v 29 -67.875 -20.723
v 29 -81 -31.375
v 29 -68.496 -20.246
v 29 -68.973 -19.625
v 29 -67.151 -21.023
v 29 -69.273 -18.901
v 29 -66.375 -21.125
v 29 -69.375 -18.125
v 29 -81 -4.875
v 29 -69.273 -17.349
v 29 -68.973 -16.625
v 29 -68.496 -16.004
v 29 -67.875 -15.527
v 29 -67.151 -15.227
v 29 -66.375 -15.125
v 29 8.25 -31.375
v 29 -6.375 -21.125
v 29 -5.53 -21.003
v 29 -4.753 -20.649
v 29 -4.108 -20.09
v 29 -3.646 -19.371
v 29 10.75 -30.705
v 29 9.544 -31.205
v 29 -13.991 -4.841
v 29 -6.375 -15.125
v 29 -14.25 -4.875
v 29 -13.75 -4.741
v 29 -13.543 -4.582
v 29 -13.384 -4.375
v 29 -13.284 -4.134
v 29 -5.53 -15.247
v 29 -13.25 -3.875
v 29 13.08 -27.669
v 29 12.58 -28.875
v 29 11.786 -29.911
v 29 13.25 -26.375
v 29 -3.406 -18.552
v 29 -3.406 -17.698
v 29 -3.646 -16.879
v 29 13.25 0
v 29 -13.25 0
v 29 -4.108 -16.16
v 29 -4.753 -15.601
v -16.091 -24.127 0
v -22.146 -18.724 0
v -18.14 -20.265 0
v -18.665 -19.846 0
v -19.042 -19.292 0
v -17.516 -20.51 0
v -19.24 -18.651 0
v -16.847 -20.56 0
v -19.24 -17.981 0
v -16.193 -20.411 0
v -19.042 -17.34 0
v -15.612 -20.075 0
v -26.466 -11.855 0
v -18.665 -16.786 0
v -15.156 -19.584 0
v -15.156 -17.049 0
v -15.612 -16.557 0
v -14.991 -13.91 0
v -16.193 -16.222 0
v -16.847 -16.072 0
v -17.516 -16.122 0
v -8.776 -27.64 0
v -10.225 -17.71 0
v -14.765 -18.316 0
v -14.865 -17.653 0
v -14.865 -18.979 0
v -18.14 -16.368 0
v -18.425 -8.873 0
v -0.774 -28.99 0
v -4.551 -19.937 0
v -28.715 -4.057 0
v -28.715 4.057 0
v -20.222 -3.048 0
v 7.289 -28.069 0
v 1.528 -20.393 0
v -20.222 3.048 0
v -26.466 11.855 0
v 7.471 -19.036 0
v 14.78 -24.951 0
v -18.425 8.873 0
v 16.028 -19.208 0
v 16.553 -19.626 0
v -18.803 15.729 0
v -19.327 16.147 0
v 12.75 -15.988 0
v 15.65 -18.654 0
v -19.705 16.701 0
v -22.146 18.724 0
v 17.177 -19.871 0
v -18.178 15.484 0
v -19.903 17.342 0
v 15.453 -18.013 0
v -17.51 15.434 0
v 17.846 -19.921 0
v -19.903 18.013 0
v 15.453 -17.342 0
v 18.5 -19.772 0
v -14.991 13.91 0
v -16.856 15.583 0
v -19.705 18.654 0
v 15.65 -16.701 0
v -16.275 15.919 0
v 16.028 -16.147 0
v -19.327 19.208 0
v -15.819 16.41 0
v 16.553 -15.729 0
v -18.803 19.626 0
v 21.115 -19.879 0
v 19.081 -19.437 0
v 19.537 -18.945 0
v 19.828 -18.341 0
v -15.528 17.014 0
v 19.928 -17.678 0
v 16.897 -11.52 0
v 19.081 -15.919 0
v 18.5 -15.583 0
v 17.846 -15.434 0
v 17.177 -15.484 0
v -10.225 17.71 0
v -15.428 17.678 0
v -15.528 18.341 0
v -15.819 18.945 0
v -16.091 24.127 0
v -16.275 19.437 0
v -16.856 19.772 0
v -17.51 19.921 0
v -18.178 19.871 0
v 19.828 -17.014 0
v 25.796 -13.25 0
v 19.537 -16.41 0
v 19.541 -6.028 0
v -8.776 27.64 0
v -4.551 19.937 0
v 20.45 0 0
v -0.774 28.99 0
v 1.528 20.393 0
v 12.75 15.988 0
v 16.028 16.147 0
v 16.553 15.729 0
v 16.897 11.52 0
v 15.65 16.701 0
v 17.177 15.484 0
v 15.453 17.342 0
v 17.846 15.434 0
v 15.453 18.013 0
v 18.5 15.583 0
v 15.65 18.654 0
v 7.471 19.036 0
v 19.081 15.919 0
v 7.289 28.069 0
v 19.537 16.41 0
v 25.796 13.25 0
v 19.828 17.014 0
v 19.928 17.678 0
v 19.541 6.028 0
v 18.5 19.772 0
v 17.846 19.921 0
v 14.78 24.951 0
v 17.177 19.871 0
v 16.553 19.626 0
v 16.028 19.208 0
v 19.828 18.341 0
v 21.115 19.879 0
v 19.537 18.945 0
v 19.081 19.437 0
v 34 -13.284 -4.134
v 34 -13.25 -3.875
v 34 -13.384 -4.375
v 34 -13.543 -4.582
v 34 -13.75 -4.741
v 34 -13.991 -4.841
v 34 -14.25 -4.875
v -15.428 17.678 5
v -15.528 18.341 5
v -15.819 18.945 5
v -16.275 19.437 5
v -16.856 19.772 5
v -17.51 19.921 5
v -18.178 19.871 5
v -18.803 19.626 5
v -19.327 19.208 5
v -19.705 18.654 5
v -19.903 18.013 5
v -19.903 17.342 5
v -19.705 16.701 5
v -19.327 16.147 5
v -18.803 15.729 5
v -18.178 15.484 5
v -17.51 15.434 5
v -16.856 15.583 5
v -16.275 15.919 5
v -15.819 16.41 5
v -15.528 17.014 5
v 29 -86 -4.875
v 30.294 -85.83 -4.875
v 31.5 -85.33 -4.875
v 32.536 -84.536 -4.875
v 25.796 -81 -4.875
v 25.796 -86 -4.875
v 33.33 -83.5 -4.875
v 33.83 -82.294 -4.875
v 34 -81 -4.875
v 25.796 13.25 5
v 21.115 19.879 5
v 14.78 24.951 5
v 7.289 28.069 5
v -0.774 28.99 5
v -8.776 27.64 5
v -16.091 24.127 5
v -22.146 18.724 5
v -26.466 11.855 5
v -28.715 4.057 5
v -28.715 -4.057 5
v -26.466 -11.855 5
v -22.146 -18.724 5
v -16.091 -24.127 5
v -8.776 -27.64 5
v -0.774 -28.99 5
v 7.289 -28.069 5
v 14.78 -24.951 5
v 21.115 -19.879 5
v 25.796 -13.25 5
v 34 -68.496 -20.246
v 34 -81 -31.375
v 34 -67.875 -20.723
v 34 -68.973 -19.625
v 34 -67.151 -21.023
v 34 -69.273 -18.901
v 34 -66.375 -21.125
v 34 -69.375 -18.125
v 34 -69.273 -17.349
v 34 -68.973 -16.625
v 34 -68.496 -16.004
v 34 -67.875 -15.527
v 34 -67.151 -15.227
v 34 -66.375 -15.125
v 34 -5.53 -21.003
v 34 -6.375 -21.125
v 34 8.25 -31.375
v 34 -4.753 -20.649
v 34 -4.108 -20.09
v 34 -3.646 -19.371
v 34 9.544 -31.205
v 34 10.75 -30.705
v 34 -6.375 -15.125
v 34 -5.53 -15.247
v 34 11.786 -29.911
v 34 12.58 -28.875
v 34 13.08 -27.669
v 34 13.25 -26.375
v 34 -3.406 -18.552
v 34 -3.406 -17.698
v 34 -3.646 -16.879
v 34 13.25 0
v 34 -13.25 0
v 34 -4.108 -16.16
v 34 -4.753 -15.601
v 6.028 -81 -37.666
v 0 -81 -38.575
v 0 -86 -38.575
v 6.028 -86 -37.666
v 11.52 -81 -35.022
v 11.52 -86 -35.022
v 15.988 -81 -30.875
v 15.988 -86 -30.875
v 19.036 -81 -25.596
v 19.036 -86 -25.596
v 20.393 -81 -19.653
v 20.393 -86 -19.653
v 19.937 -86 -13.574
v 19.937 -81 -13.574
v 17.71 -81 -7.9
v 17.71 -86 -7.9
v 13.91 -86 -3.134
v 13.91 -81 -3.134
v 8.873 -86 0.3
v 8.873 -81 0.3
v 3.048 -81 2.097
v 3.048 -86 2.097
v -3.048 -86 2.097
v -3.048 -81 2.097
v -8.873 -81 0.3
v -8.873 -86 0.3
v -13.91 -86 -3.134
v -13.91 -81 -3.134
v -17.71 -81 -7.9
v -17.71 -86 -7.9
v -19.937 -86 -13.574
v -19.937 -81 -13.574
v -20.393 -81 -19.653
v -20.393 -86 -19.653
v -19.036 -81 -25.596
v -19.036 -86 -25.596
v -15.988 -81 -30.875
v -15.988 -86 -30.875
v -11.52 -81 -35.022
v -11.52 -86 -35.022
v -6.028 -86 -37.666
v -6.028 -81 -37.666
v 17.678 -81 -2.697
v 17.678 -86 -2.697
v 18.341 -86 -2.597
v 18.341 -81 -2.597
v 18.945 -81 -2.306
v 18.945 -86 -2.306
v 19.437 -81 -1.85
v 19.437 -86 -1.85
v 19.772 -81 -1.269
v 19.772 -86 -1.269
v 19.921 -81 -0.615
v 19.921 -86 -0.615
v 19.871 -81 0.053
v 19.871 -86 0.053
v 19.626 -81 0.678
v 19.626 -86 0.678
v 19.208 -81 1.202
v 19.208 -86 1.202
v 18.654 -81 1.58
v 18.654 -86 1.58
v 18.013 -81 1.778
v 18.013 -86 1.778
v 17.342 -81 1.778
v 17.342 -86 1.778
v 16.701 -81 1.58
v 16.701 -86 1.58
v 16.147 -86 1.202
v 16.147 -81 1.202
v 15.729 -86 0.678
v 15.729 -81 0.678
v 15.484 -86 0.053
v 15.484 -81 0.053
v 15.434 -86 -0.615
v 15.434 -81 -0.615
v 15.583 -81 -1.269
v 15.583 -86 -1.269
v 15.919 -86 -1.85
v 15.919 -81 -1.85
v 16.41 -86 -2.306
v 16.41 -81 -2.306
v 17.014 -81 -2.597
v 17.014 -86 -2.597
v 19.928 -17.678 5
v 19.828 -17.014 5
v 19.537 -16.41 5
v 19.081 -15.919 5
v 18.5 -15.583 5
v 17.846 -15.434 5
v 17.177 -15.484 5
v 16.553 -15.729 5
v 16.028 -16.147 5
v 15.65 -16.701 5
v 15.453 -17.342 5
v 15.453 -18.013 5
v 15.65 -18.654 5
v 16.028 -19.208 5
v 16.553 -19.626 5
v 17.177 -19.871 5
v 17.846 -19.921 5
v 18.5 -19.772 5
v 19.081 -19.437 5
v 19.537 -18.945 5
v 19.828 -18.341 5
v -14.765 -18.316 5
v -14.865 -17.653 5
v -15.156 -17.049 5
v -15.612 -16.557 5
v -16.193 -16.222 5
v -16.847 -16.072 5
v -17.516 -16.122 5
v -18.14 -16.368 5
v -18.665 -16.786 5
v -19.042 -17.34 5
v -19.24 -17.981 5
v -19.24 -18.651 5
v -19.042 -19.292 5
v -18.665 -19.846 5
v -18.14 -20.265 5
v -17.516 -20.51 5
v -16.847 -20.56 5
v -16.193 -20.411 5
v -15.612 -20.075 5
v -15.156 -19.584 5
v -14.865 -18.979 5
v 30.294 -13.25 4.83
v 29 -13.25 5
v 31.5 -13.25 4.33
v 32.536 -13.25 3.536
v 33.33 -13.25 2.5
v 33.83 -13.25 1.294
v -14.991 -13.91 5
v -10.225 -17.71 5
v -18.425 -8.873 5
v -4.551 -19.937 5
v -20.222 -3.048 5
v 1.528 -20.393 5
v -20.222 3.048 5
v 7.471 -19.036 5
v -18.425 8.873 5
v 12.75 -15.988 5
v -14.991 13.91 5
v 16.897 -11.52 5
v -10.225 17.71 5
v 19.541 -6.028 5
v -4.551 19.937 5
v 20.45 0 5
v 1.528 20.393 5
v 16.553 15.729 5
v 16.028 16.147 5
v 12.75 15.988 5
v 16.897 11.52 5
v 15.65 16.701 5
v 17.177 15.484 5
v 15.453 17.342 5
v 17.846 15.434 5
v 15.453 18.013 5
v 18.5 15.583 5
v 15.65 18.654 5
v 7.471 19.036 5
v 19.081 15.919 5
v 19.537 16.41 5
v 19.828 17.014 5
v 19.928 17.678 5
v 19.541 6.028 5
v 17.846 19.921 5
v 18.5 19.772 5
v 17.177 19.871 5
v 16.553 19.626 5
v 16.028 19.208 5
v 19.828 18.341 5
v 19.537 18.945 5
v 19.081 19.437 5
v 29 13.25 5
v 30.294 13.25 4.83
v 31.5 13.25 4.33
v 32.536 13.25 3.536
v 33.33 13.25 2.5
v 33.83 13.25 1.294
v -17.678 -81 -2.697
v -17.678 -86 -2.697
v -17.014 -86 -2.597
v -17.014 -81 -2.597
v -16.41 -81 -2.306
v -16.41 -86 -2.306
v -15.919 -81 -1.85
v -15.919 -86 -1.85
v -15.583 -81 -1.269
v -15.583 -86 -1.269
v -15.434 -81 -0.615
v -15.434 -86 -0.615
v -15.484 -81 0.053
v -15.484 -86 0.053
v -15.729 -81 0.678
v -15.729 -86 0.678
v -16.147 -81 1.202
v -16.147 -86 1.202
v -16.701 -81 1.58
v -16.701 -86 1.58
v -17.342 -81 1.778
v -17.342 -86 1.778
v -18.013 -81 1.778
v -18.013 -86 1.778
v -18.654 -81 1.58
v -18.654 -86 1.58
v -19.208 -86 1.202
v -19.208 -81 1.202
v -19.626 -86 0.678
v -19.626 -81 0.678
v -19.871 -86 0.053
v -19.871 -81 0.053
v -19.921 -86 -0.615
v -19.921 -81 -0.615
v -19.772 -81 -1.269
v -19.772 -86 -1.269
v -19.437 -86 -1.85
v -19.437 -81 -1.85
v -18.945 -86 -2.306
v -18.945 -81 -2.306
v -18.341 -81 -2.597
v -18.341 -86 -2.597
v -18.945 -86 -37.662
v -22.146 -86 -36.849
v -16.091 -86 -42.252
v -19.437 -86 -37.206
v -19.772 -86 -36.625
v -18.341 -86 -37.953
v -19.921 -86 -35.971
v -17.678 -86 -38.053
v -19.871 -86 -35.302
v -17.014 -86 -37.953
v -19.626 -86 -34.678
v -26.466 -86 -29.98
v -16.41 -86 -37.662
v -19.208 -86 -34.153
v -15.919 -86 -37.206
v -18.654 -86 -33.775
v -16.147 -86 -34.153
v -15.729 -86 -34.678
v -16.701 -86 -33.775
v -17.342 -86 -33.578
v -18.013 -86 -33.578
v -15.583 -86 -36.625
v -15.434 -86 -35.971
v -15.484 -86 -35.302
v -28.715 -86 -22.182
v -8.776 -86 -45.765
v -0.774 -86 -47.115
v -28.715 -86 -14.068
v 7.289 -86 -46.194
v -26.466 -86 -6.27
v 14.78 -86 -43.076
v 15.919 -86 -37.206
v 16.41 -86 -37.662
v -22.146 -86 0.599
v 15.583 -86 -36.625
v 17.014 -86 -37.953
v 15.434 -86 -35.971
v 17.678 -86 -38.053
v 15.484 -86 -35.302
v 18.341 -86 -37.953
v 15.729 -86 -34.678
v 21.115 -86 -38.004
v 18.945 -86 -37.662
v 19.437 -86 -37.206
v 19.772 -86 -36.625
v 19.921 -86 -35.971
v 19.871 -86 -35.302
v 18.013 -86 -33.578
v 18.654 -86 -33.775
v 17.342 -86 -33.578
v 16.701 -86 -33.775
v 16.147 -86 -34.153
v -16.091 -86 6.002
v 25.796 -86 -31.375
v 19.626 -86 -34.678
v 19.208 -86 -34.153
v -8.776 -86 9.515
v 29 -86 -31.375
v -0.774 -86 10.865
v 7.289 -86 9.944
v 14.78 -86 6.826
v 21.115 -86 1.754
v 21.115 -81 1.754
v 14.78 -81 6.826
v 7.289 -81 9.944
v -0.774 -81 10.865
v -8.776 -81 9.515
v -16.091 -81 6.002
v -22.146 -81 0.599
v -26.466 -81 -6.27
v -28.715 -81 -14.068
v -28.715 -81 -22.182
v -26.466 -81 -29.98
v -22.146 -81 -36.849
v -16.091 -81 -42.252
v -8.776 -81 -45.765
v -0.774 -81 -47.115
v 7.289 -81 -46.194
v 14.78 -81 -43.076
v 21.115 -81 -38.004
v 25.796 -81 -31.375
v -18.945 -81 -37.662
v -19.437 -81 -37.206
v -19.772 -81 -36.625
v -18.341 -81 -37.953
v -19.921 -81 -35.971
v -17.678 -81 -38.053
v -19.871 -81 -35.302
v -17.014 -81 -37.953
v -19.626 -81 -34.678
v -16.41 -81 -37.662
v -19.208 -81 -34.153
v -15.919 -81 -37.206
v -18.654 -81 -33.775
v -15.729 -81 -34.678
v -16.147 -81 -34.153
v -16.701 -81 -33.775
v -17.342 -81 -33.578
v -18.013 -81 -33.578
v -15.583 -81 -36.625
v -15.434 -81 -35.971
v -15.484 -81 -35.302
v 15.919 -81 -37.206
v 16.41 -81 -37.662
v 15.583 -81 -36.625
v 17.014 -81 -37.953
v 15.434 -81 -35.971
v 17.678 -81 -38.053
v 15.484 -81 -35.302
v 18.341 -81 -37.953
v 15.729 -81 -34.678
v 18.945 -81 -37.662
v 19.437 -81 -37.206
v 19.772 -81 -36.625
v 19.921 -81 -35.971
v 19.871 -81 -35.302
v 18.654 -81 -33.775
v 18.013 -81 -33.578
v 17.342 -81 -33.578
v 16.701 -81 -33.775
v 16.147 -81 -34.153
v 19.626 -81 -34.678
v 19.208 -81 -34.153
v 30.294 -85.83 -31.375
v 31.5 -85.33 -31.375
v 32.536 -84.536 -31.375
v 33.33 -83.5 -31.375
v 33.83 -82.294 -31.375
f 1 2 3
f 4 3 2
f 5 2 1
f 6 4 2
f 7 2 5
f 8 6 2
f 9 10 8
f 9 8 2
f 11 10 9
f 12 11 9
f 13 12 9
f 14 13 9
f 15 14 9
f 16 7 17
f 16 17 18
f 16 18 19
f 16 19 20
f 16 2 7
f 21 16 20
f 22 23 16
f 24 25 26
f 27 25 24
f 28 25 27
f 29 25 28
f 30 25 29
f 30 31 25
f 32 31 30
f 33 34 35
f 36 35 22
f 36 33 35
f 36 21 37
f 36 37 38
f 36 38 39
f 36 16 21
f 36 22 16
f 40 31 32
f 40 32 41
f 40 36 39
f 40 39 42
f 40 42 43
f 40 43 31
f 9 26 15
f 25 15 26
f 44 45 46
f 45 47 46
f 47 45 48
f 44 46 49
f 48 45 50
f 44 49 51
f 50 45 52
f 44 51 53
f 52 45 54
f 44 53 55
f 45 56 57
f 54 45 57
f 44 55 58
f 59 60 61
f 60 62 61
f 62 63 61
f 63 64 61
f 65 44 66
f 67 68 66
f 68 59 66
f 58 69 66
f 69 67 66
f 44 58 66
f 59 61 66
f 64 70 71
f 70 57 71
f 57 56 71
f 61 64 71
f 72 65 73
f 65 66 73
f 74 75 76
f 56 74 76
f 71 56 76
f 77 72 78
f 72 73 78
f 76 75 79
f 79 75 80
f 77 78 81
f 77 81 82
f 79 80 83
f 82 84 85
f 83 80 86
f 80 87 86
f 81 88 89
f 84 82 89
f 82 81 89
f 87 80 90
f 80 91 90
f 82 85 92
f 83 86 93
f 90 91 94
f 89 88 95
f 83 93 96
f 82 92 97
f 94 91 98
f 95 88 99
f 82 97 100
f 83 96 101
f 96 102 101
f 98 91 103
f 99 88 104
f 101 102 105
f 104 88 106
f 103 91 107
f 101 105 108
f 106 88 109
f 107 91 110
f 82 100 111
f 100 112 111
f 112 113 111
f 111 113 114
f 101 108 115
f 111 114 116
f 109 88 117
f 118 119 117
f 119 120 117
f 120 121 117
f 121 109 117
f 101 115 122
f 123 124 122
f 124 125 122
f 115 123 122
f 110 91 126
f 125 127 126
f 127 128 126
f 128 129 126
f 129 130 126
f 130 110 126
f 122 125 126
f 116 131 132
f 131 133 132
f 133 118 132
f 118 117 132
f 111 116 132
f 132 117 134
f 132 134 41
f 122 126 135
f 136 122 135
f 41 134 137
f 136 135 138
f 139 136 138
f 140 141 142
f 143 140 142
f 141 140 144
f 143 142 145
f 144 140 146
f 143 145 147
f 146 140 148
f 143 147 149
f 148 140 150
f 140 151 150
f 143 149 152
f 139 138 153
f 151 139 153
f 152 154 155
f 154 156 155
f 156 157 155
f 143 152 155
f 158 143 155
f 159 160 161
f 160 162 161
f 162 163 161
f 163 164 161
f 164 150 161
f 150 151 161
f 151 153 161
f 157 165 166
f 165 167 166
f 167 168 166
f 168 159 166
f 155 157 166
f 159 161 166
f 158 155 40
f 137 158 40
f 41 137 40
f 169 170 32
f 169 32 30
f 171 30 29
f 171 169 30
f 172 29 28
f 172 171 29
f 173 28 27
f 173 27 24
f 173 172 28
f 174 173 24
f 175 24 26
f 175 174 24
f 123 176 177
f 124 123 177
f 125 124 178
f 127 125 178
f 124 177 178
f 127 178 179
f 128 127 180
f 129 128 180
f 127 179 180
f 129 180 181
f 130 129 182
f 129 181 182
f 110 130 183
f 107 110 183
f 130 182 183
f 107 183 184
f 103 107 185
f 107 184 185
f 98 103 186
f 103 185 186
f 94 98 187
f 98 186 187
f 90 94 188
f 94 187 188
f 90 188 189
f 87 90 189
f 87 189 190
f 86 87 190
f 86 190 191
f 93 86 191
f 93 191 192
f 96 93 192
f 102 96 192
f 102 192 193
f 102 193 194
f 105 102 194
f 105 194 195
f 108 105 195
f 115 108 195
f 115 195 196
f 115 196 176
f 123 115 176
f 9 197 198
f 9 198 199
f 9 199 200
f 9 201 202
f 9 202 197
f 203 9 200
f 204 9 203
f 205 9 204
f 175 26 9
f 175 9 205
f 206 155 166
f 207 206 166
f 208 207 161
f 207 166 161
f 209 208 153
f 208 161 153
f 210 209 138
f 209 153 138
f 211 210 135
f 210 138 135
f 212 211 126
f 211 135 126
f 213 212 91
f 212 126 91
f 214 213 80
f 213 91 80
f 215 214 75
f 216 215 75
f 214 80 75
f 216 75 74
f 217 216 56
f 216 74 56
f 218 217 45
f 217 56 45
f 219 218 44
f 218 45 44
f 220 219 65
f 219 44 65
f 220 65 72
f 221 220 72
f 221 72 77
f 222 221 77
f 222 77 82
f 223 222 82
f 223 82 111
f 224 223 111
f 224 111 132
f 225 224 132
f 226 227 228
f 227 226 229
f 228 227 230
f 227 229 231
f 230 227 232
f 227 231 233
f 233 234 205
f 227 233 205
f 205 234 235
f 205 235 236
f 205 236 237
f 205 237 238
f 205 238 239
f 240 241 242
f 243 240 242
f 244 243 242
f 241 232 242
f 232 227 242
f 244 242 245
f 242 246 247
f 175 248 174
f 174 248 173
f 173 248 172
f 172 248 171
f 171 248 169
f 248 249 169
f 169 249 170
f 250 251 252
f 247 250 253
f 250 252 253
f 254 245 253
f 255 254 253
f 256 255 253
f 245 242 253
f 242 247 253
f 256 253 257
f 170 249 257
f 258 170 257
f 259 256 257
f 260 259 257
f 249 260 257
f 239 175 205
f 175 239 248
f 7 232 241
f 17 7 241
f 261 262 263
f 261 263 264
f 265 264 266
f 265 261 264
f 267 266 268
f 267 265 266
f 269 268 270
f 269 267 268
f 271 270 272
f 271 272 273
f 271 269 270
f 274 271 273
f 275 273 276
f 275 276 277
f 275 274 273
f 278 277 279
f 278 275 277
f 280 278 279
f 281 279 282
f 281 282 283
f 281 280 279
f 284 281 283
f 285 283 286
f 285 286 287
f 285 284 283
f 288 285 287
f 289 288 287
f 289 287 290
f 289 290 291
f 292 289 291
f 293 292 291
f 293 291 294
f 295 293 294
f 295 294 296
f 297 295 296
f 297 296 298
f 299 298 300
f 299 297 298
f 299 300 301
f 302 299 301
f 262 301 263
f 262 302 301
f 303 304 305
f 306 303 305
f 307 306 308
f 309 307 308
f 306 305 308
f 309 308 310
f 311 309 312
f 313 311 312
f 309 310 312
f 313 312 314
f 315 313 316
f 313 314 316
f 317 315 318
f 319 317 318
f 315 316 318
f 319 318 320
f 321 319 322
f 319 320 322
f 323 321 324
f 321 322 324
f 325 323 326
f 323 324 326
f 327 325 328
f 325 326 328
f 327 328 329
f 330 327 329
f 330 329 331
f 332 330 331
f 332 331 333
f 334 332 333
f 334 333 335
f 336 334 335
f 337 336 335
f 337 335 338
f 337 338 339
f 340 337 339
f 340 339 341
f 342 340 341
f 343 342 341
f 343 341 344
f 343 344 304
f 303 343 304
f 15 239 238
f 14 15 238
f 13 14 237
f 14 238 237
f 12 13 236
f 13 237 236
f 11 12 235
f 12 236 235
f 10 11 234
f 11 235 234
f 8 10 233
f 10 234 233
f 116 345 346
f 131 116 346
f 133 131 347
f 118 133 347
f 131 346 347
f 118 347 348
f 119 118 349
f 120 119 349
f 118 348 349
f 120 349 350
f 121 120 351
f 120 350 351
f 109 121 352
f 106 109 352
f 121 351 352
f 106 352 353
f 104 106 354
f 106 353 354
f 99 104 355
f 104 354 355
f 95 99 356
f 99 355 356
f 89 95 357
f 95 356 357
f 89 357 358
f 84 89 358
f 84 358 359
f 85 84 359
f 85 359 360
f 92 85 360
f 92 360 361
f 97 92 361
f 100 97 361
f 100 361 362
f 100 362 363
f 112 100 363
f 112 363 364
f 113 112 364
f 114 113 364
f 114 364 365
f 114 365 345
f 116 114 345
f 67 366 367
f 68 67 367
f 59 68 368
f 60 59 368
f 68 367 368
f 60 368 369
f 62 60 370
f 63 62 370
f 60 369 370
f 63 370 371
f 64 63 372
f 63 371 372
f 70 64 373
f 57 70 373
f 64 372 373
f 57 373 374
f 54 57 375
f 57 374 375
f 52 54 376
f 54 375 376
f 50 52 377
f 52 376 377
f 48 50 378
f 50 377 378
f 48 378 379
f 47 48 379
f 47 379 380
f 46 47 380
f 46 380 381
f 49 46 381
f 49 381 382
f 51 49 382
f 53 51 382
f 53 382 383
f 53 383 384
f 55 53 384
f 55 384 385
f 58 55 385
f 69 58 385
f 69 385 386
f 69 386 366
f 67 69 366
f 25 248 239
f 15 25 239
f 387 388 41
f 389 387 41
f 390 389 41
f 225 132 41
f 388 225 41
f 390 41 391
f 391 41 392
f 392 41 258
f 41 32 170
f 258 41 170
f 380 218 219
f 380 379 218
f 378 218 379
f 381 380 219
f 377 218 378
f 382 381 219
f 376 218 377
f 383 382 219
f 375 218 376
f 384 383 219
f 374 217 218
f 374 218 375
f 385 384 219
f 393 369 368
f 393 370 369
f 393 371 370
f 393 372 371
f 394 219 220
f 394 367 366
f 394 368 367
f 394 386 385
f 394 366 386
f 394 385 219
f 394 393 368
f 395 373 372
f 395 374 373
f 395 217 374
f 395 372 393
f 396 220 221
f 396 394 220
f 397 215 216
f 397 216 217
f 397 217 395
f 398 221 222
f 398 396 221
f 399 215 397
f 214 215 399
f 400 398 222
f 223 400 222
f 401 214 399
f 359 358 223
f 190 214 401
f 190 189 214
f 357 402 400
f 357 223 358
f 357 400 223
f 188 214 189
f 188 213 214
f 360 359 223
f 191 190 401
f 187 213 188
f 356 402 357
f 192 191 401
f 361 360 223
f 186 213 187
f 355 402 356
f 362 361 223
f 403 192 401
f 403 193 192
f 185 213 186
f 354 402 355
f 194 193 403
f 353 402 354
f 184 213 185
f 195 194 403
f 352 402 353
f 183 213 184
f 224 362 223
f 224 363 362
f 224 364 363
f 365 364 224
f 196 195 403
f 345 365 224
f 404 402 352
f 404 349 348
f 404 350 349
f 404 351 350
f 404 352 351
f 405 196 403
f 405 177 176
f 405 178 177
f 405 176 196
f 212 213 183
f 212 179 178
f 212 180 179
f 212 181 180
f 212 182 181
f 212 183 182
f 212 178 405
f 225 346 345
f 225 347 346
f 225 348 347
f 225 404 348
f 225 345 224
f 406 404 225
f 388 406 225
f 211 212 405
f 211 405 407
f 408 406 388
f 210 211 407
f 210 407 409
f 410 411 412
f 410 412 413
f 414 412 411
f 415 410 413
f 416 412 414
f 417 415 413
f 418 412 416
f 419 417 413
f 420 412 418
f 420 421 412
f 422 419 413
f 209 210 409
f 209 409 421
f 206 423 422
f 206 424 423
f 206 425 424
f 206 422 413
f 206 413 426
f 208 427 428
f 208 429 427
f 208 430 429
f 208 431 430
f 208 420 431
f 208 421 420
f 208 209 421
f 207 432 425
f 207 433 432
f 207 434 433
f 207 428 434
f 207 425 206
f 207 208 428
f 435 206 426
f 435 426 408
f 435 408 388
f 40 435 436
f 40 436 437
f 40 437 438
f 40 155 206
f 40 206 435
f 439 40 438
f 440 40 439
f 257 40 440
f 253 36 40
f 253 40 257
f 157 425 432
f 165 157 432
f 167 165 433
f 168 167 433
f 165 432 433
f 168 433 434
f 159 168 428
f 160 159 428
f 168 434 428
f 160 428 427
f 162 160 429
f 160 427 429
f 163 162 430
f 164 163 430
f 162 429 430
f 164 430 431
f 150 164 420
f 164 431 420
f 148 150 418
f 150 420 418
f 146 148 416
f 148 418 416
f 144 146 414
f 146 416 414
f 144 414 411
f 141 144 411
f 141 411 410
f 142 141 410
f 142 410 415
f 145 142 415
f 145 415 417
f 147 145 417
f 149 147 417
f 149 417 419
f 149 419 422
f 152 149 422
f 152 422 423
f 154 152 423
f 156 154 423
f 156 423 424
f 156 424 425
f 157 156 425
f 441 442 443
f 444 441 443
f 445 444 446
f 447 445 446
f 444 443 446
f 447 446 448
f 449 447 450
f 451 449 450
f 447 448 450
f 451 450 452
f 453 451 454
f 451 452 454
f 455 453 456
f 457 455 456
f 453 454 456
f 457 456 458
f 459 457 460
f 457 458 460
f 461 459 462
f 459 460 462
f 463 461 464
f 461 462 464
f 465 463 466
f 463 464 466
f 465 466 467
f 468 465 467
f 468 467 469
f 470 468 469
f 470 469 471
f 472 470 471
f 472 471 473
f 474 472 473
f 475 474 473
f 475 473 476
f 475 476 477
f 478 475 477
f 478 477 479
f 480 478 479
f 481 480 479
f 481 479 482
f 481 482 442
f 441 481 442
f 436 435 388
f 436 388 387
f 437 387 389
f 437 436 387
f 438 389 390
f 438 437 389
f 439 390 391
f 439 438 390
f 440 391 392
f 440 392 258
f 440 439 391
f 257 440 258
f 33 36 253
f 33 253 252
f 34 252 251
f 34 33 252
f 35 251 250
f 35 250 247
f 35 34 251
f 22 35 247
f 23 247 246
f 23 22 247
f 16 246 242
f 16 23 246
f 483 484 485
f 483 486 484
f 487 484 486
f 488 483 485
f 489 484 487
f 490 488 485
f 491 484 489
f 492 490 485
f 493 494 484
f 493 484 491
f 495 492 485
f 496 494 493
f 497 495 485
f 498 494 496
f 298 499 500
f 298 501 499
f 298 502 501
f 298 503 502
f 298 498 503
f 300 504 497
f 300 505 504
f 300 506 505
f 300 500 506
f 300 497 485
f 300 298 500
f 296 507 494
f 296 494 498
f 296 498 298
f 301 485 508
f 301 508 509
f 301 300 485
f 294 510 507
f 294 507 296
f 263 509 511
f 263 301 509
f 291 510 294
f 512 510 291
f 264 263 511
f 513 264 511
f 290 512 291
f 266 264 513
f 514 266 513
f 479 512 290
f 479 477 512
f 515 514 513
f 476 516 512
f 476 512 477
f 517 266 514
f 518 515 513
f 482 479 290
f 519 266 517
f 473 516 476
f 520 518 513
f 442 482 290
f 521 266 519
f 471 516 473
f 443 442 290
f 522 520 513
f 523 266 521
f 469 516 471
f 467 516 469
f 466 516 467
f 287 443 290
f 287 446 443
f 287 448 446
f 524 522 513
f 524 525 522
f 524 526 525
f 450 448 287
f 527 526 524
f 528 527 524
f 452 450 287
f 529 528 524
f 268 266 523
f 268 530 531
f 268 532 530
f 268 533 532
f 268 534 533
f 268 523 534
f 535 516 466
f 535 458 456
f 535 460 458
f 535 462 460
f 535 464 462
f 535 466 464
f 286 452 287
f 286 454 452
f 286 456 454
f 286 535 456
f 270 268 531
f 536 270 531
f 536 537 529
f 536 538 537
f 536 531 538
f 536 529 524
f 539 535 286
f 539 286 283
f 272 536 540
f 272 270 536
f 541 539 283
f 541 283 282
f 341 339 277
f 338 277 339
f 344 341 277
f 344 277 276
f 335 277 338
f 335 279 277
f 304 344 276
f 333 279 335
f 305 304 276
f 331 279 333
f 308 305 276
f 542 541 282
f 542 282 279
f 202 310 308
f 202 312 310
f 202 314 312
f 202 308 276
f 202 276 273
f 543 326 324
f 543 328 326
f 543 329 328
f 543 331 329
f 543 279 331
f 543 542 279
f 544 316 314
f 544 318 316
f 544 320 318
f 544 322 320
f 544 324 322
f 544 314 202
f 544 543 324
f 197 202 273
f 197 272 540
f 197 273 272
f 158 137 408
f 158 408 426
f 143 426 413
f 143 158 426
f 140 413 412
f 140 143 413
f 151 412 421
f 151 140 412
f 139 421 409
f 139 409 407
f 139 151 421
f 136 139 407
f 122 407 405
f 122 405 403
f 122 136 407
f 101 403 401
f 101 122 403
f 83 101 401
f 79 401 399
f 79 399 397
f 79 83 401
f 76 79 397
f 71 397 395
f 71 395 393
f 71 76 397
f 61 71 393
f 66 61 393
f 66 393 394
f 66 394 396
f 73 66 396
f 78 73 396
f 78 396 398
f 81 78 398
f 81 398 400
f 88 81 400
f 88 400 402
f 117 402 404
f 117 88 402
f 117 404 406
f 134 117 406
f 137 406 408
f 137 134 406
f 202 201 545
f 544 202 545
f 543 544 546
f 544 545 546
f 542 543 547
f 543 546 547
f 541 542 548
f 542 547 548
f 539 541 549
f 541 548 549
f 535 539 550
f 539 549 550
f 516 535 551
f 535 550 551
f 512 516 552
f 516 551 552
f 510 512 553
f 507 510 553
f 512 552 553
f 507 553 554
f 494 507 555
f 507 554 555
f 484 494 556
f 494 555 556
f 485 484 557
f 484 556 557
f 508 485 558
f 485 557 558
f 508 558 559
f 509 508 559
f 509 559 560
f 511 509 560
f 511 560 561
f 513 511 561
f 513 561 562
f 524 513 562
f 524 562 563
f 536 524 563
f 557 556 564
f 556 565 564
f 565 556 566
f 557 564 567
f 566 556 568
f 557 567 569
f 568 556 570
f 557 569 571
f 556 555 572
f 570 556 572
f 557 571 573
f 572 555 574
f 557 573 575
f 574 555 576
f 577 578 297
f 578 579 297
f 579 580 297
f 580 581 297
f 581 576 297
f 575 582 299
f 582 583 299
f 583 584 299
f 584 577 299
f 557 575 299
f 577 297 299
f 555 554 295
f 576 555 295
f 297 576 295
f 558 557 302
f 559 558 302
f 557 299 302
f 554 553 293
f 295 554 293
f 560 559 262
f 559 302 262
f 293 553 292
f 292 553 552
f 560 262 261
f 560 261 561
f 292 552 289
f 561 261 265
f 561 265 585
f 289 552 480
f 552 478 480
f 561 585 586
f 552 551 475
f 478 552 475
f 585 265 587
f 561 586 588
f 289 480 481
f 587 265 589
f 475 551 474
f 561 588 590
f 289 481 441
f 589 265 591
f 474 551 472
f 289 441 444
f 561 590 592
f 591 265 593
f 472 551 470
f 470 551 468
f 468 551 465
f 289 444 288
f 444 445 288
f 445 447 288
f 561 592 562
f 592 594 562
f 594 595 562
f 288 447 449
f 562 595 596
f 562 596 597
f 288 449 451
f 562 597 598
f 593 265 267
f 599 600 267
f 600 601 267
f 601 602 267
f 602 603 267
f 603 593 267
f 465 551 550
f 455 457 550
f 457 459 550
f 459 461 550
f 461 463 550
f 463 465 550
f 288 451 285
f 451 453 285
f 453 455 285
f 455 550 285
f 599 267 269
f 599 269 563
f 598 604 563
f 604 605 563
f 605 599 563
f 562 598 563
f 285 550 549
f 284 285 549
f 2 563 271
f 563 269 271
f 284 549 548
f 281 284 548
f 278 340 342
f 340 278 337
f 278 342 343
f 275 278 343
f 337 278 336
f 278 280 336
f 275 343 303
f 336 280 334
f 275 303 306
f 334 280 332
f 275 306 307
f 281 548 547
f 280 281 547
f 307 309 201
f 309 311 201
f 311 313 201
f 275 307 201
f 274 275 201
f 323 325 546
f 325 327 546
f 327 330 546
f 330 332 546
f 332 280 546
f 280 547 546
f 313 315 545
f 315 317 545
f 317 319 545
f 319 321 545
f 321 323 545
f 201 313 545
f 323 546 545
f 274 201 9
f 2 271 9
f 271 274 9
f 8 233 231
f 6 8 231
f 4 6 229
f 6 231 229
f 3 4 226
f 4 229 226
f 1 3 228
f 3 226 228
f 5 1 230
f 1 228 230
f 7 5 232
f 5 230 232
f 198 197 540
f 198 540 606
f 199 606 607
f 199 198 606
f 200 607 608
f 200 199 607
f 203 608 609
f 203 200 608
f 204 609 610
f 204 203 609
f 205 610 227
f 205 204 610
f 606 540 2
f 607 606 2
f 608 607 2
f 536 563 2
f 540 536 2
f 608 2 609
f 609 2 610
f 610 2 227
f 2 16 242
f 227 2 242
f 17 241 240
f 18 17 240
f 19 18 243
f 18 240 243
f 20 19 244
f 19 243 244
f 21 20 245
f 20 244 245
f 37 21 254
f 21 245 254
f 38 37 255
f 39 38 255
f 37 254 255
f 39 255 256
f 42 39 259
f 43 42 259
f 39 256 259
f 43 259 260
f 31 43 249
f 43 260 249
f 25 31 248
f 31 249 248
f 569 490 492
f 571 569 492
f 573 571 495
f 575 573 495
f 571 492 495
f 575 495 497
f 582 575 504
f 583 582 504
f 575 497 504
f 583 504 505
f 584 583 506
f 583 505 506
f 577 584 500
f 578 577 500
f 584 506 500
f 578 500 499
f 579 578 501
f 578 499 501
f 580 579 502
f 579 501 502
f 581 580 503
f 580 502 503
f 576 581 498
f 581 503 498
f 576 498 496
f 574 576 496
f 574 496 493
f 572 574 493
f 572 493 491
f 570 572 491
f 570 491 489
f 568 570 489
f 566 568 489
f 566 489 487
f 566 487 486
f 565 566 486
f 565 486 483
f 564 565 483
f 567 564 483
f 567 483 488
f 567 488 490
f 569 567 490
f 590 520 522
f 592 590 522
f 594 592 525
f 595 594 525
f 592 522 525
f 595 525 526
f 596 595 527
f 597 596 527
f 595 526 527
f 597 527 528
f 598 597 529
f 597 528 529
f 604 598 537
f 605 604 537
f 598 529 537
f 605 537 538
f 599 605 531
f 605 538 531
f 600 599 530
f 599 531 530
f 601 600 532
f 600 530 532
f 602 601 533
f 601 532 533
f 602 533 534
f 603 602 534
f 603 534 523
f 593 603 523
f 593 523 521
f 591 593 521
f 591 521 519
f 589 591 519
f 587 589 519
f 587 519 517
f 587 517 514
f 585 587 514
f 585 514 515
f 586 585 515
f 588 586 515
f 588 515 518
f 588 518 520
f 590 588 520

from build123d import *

# Parameters (mm, degrees)
SKETCH1_R           = 20.45
BOSS_EXTRUDE2_DEPTH = 5
BOSS_EXTRUDE3_DEPTH = 5
SKETCH14_R          = 20.45
BOSS_EXTRUDE6_DEPTH = 5
CUT_EXTRUDE2_DEPTH  = 5
BOSS_EXTRUDE7_DEPTH = 26.5
BOSS_EXTRUDE8_DEPTH = 26.5
CUT_EXTRUDE3_DEPTH  = 26.5
SKETCH24_R          = 2.25
CUT_EXTRUDE5_DEPTH  = 10
SKETCH25_R          = 2.25
CUT_EXTRUDE6_DEPTH  = 10


with BuildPart() as part:
    # Sketch1 → Boss-Extrude2 (new body)
    with BuildSketch(Plane.XY):
        with BuildLine():
            Line((29, 13.25), (25.796075283, 13.25))
            ThreePointArc((25.796075283, 13.25), (-29, 0), (25.796075283, -13.25))
            Line((25.796075283, -13.25), (29, -13.25))
            Line((29, -13.25), (29, 13.25))
        make_face()
        Circle(SKETCH1_R, mode=Mode.SUBTRACT)
    extrude(amount=BOSS_EXTRUDE2_DEPTH)



with BuildPart() as body_2:
    # Sketch2 → Boss-Extrude3 (new body)
    with BuildSketch(Plane(origin=(29, 0, 0), x_dir=(0, 0, -1), z_dir=(1, 0, 0))):
        with BuildLine():
            Line((0, 13.25), (26.375, 13.25))
            ThreePointArc((26.375, 13.25), (29.910533906, 11.785533906), (31.375, 8.25))
            Line((31.375, 8.25), (31.375, -81))
            Line((31.375, -81), (0, -81))
            Line((0, -81), (0, -13.25))
            Line((0, -13.25), (0, 13.25))
        make_face()
    extrude(amount=BOSS_EXTRUDE3_DEPTH)

    # Sketch17 → Cut-Extrude2 (cut)
    with BuildSketch(Plane(origin=(34, 0, 0), x_dir=(0, 0, -1), z_dir=(1, 0, 0))):
        with BuildLine():
            Line((0, -13.25), (3.875, -13.25))
            ThreePointArc((3.875, -13.25), (4.582106781, -13.542893219), (4.875, -14.25))
            Line((4.875, -14.25), (4.875, -81))
            Line((4.875, -81), (0, -81))
            Line((0, -81), (0, -13.25))
        make_face()
    extrude(amount=-CUT_EXTRUDE2_DEPTH, mode=Mode.SUBTRACT)


with BuildPart() as body_3:
    # Sketch14 → Boss-Extrude6 (new body)
    with BuildSketch(Plane.XZ.offset(81)):
        with BuildLine():
            Line((29, -4.875), (25.796075283, -4.875))
            ThreePointArc((25.796075283, -4.875), (-29, -18.125), (25.796075283, -31.375))
            Line((25.796075283, -31.375), (29, -31.375))
            Line((29, -31.375), (29, -4.875))
        make_face()
        with Locations(Location((0, -18.125, 0), (0, 0, 270))):
            Circle(SKETCH14_R, mode=Mode.SUBTRACT)
    extrude(amount=BOSS_EXTRUDE6_DEPTH)


with BuildPart() as part_1:
    add(part.part)

    add(body_2.part)  # Boss-Extrude7 merges body 2
    # Sketch21 → Boss-Extrude7 (add)
    with BuildSketch(Plane(origin=(0, 13.25, 0), x_dir=(1, 0, 0), z_dir=(0, 1, 0))):
        with BuildLine():
            Line((29, 0), (29, -5))
            ThreePointArc((29, -5), (32.535533906, -3.535533906), (34, 0))
            Line((34, 0), (29, 0))
        make_face()
    extrude(amount=-BOSS_EXTRUDE7_DEPTH)


    add(body_3.part)  # Boss-Extrude8 merges body 3
    # Sketch22 → Boss-Extrude8 (add)
    with BuildSketch(Plane.XY.offset(-4.875)):
        with BuildLine():
            ThreePointArc((29, -86), (32.535533906, -84.535533906), (34, -81))
            Line((34, -81), (29, -81))
            Line((29, -81), (29, -86))
        make_face()
    extrude(amount=-BOSS_EXTRUDE8_DEPTH)

    # Sketch23 → Cut-Extrude3 (cut)
    with BuildSketch(Plane(origin=(34, 0, 0), x_dir=(0, 0, -1), z_dir=(1, 0, 0))):
        with BuildLine():
            Line((15.125, -6.375), (15.125, -36.375))
            Line((15.125, -36.375), (18.125, -36.375))
            Line((18.125, -36.375), (21.125, -36.375))
            Line((21.125, -36.375), (21.125, -6.375))
            ThreePointArc((21.125, -6.375), (18.125, -3.375), (15.125, -6.375))
        make_face()
        with BuildLine():
            Line((21.125, -36.375), (18.125, -36.375))
            Line((18.125, -36.375), (18.125, -69.375))
            ThreePointArc((18.125, -69.375), (20.246320344, -68.496320344), (21.125, -66.375))
            Line((21.125, -66.375), (21.125, -36.375))
        make_face()
        with BuildLine():
            Line((18.125, -36.375), (15.125, -36.375))
            Line((15.125, -36.375), (15.125, -66.375))
            ThreePointArc((15.125, -66.375), (16.003679656, -68.496320344), (18.125, -69.375))
            Line((18.125, -69.375), (18.125, -36.375))
        make_face()
    extrude(amount=-CUT_EXTRUDE3_DEPTH, mode=Mode.SUBTRACT)

    # Sketch24 → Cut-Extrude5 (cut)
    with BuildSketch(Plane.XY.offset(5)):
        with Locations((17.67766953, 17.67766953)):
            Circle(SKETCH24_R)
        with Locations((17.67766953, -17.67766953)):
            Circle(SKETCH24_R)
        with Locations((-17.67766953, 17.67766953)):
            Circle(SKETCH24_R)
        with Locations((-17.01531967, -18.316083002)):
            Circle(SKETCH24_R)
    extrude(amount=-CUT_EXTRUDE5_DEPTH, mode=Mode.SUBTRACT)

    # Sketch25 → Cut-Extrude6 (cut)
    with BuildSketch(Plane.XZ.offset(86)):
        with Locations(Location((-17.67766953, -0.44733047, 0), (0, 0, 270))):
            Circle(SKETCH25_R)
        with Locations(Location((17.67766953, -0.44733047, 0), (0, 0, 270))):
            Circle(SKETCH25_R)
        with Locations(Location((17.67766953, -35.80266953, 0), (0, 0, 270))):
            Circle(SKETCH25_R)
        with Locations(Location((-17.67766953, -35.80266953, 0), (0, 0, 270))):
            Circle(SKETCH25_R)
    extrude(amount=-CUT_EXTRUDE6_DEPTH, mode=Mode.SUBTRACT)


solid = part_1.part
